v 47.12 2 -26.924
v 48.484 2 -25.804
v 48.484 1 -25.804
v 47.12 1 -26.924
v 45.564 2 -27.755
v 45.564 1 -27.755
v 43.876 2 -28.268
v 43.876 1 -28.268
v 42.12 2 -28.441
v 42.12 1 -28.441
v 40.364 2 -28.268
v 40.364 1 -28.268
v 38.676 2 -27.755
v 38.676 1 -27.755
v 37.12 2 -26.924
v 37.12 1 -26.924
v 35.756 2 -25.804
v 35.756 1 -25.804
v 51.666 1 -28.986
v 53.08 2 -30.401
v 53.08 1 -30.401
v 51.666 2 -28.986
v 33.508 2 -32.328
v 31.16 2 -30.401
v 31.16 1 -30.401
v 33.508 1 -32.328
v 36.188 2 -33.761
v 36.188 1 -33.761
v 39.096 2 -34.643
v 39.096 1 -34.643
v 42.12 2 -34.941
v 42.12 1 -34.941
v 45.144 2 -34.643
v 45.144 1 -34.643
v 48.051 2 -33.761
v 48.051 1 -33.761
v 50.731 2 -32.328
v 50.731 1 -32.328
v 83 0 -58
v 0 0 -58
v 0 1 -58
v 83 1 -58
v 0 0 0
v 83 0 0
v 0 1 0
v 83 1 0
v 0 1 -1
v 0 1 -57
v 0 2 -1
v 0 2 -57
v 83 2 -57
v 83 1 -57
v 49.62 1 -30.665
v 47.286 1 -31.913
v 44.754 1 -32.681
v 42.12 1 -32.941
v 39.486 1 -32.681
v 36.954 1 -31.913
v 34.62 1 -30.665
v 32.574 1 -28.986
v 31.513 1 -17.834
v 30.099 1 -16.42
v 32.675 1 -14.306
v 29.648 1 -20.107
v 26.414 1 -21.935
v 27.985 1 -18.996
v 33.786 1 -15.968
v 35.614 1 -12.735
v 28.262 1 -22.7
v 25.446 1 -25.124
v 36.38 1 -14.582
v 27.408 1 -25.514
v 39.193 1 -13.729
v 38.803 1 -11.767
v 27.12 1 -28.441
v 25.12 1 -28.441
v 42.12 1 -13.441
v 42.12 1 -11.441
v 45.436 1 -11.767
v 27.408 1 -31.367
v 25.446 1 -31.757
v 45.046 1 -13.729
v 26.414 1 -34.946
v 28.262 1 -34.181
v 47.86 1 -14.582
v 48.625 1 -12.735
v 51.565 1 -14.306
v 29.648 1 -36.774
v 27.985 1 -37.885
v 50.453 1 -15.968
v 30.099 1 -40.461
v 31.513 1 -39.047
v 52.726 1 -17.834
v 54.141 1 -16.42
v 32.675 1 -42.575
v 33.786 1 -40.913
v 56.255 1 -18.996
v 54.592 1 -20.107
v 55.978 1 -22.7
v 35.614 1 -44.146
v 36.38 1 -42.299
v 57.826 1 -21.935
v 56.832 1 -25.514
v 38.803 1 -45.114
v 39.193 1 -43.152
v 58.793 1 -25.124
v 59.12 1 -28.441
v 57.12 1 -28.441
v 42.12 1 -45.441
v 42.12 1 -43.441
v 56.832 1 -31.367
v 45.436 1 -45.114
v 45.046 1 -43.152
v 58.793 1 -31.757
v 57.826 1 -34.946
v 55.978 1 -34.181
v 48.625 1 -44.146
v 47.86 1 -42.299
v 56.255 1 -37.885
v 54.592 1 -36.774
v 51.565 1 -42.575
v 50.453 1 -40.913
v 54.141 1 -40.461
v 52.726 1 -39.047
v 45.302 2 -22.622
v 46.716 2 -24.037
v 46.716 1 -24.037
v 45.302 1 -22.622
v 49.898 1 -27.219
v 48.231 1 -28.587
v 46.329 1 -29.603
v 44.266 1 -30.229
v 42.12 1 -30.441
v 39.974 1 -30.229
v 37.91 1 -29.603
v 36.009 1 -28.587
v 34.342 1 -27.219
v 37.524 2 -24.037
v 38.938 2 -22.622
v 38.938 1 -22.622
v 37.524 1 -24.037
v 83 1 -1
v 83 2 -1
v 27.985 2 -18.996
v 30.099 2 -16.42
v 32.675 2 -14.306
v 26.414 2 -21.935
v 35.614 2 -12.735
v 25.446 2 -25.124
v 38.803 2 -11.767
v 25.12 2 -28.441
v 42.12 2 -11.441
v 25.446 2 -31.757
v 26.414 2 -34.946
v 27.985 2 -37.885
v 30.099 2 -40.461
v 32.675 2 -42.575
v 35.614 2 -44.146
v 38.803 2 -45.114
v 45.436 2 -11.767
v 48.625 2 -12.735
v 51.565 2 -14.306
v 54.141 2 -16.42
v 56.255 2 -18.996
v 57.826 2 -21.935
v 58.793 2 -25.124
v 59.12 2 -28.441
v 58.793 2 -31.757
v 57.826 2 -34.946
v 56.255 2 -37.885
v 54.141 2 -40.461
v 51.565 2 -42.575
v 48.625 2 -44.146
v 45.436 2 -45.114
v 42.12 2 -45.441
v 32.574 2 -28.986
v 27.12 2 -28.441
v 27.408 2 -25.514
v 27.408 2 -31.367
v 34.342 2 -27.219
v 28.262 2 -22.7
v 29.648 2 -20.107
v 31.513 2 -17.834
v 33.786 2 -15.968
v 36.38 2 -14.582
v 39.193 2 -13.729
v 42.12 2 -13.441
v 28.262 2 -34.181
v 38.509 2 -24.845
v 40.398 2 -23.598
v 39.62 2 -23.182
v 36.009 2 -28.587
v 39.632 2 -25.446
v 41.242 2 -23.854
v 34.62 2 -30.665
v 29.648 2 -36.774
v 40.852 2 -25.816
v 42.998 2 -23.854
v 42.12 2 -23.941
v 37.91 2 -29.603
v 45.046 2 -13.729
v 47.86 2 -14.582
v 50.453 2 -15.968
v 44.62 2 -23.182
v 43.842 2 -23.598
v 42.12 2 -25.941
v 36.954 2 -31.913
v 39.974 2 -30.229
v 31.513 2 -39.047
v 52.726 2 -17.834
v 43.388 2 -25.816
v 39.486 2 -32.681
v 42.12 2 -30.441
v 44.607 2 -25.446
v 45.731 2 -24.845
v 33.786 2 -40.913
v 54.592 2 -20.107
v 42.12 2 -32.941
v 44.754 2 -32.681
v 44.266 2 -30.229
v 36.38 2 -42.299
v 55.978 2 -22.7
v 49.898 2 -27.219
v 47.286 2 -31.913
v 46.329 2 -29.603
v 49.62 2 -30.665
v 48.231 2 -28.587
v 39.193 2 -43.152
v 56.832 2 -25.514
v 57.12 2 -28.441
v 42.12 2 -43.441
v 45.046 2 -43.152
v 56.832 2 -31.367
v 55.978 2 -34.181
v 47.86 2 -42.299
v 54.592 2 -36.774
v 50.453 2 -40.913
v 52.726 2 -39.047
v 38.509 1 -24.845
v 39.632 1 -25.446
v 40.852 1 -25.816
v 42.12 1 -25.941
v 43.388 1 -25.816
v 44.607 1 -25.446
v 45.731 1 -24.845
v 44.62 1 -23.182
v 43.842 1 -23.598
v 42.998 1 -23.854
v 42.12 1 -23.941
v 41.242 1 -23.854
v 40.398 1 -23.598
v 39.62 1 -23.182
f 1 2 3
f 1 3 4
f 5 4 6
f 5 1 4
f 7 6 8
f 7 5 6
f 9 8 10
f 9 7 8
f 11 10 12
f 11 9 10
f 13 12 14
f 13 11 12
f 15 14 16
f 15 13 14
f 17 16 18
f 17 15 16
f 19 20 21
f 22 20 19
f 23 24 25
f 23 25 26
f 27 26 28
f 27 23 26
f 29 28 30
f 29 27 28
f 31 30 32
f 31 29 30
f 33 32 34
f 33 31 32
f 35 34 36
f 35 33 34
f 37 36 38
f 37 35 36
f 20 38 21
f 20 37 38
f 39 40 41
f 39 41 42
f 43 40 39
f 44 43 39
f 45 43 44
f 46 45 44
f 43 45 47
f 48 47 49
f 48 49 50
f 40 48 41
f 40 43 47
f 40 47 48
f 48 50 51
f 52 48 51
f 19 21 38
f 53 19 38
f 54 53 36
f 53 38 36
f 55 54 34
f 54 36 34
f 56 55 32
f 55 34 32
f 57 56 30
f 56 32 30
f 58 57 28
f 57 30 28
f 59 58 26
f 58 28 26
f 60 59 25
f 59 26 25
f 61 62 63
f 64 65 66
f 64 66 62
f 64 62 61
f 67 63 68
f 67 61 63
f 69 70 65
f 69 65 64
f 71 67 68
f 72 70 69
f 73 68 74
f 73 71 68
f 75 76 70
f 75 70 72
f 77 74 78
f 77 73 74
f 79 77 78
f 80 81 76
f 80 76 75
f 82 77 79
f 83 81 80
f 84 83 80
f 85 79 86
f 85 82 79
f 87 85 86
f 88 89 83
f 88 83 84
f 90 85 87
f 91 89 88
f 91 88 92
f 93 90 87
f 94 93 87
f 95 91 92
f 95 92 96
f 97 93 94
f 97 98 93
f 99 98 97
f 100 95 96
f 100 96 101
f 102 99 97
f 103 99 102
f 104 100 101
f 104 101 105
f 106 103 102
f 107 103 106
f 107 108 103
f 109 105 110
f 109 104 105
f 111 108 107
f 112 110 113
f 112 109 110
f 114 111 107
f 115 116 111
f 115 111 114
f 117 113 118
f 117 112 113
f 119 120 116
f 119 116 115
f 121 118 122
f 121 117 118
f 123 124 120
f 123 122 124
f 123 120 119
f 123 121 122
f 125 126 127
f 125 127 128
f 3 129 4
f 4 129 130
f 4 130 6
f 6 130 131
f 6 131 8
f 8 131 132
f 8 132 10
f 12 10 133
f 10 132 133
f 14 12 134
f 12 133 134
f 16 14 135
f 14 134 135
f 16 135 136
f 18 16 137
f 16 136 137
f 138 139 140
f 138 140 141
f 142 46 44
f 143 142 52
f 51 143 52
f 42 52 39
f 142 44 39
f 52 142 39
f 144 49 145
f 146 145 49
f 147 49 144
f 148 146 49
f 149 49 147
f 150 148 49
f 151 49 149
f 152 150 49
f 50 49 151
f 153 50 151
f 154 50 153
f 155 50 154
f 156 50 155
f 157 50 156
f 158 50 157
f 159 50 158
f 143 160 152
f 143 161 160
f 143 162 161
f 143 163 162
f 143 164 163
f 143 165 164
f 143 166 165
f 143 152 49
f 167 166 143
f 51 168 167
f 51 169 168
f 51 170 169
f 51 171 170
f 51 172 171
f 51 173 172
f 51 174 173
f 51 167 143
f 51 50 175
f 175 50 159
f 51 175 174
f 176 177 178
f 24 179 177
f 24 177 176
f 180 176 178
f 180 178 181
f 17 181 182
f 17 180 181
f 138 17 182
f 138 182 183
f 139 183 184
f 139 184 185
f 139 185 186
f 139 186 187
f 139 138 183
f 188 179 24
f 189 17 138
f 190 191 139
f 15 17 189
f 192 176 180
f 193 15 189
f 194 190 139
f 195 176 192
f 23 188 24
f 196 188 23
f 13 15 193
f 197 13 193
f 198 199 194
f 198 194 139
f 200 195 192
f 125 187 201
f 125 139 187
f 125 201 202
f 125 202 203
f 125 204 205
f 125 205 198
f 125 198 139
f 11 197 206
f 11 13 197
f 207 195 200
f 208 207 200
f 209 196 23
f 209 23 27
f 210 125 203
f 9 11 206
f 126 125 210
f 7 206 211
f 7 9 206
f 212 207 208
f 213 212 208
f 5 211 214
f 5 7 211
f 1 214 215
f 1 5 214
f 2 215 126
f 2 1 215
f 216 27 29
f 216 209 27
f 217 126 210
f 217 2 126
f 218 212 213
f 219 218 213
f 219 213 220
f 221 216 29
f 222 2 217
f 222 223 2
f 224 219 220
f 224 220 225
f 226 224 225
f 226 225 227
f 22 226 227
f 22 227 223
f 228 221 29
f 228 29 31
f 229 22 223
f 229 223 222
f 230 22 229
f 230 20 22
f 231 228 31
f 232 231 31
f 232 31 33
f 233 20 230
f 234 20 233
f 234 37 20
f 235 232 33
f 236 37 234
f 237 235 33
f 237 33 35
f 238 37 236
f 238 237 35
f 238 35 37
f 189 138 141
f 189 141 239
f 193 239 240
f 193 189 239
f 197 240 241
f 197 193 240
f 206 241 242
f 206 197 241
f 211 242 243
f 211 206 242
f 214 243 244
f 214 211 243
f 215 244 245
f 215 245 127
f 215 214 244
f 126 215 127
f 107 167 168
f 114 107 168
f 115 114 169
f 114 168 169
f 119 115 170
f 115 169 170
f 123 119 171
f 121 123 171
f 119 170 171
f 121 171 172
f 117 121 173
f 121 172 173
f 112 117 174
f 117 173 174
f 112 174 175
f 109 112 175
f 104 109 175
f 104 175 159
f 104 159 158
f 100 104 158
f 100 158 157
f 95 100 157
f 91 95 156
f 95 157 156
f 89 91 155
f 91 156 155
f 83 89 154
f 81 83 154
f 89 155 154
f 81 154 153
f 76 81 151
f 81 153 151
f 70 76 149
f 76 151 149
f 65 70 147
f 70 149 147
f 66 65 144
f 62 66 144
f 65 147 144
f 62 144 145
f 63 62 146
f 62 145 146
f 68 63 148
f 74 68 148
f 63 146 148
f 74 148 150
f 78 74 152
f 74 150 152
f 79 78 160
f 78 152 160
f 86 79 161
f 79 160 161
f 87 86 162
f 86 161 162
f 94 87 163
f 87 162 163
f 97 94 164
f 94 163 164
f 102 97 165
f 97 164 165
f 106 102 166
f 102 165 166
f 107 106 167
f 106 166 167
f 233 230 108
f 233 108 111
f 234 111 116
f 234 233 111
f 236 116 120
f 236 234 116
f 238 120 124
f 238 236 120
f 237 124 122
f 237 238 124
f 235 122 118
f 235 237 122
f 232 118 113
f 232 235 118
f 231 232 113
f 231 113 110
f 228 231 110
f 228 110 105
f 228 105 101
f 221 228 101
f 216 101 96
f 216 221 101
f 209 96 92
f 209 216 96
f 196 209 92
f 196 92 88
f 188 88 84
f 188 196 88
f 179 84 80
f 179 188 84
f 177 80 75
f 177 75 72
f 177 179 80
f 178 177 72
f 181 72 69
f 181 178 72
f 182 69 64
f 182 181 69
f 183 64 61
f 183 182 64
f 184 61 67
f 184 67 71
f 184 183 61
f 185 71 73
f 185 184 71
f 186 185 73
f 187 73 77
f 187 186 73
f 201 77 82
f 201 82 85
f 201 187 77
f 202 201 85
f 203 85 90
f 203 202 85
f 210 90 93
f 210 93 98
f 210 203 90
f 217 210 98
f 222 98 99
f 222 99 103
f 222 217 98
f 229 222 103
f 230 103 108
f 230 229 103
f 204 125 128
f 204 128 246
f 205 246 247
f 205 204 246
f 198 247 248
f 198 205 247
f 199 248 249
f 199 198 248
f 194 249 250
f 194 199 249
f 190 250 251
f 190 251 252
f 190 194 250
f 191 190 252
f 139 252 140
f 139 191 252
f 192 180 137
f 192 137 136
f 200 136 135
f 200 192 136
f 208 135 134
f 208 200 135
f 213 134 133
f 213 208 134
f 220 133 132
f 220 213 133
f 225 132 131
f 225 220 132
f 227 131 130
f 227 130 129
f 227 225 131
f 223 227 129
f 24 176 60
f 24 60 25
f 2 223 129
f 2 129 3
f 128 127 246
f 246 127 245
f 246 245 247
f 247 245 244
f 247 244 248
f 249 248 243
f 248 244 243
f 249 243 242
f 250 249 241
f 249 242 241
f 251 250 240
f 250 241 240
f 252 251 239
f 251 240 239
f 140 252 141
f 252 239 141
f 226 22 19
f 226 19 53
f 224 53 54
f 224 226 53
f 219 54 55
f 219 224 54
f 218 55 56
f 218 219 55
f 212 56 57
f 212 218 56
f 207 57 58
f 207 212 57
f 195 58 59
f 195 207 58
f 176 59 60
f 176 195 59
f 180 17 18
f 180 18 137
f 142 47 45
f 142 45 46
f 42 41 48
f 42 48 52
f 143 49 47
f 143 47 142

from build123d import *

# Parameters (mm, degrees)
SKIZZE1_W                       = 83
SKIZZE1_H                       = 58
AUFSATZ_LINEAR_AUSTRAGEN1_DEPTH = 2
SKIZZE2_W                       = 83
SKIZZE2_H                       = 1
SCHNITT_LINEAR_AUSTRAGEN1_DEPTH = 1
SKIZZE3_R                       = 17
SKIZZE3_R_2                     = 15
SCHNITT_LINEAR_AUSTRAGEN2_DEPTH = 1


with BuildPart() as part:
    # Skizze1 → Aufsatz-Linear austragen1 (new body)
    with BuildSketch(Plane(origin=(0, 0, 0), x_dir=(1, 0, 0), z_dir=(0, 1, 0))):
        with Locations((41.5, 29)):
            Rectangle(SKIZZE1_W, SKIZZE1_H)
    extrude(amount=AUFSATZ_LINEAR_AUSTRAGEN1_DEPTH)

    # Skizze2 → Schnitt-Linear austragen1 (cut)
    with BuildSketch(Plane(origin=(0, 2, 0), x_dir=(1, 0, 0), z_dir=(0, 1, 0))):
        with Locations((41.5, 57.5)):
            Rectangle(SKIZZE2_W, SKIZZE2_H)
        with Locations((41.5, 0.5)):
            Rectangle(SKIZZE2_W, SKIZZE2_H)
    extrude(amount=-SCHNITT_LINEAR_AUSTRAGEN1_DEPTH, mode=Mode.SUBTRACT)

    # Skizze3 → Schnitt-Linear austragen2 (cut)
    with BuildSketch(Plane(origin=(0, 2, 0), x_dir=(1, 0, 0), z_dir=(0, 1, 0))):
        with Locations((42.119824852, 28.44050911)):
            Circle(SKIZZE3_R)
        with Locations((42.119824852, 28.44050911)):
            Circle(SKIZZE3_R_2, mode=Mode.SUBTRACT)
        with BuildLine():
            ThreePointArc((31.159669744, 30.400664218), (42.119824852, 34.94050911), (53.079979961, 30.400664218))
            Line((53.079979961, 30.400664218), (51.665766398, 28.986450656))
            ThreePointArc((51.665766398, 28.986450656), (42.119824852, 32.94050911), (32.573883306, 28.986450656))
            Line((32.573883306, 28.986450656), (31.159669744, 30.400664218))
        make_face()
        with BuildLine():
            Line((35.755863822, 25.80447014), (34.341650259, 27.218683703))
            ThreePointArc((34.341650259, 27.218683703), (42.119824852, 30.44050911), (49.897999445, 27.218683703))
            Line((49.897999445, 27.218683703), (48.483785883, 25.80447014))
            ThreePointArc((48.483785883, 25.80447014), (42.119824852, 28.44050911), (35.755863822, 25.80447014))
        make_face()
        with BuildLine():
            Line((38.937844337, 22.622489625), (37.523630775, 24.036703187))
            ThreePointArc((37.523630775, 24.036703187), (42.119824852, 25.94050911), (46.71601893, 24.036703187))
            Line((46.71601893, 24.036703187), (45.301805368, 22.622489625))
            ThreePointArc((45.301805368, 22.622489625), (42.119824852, 23.94050911), (38.937844337, 22.622489625))
        make_face()
    extrude(amount=-SCHNITT_LINEAR_AUSTRAGEN2_DEPTH, mode=Mode.SUBTRACT)


solid = part.part
